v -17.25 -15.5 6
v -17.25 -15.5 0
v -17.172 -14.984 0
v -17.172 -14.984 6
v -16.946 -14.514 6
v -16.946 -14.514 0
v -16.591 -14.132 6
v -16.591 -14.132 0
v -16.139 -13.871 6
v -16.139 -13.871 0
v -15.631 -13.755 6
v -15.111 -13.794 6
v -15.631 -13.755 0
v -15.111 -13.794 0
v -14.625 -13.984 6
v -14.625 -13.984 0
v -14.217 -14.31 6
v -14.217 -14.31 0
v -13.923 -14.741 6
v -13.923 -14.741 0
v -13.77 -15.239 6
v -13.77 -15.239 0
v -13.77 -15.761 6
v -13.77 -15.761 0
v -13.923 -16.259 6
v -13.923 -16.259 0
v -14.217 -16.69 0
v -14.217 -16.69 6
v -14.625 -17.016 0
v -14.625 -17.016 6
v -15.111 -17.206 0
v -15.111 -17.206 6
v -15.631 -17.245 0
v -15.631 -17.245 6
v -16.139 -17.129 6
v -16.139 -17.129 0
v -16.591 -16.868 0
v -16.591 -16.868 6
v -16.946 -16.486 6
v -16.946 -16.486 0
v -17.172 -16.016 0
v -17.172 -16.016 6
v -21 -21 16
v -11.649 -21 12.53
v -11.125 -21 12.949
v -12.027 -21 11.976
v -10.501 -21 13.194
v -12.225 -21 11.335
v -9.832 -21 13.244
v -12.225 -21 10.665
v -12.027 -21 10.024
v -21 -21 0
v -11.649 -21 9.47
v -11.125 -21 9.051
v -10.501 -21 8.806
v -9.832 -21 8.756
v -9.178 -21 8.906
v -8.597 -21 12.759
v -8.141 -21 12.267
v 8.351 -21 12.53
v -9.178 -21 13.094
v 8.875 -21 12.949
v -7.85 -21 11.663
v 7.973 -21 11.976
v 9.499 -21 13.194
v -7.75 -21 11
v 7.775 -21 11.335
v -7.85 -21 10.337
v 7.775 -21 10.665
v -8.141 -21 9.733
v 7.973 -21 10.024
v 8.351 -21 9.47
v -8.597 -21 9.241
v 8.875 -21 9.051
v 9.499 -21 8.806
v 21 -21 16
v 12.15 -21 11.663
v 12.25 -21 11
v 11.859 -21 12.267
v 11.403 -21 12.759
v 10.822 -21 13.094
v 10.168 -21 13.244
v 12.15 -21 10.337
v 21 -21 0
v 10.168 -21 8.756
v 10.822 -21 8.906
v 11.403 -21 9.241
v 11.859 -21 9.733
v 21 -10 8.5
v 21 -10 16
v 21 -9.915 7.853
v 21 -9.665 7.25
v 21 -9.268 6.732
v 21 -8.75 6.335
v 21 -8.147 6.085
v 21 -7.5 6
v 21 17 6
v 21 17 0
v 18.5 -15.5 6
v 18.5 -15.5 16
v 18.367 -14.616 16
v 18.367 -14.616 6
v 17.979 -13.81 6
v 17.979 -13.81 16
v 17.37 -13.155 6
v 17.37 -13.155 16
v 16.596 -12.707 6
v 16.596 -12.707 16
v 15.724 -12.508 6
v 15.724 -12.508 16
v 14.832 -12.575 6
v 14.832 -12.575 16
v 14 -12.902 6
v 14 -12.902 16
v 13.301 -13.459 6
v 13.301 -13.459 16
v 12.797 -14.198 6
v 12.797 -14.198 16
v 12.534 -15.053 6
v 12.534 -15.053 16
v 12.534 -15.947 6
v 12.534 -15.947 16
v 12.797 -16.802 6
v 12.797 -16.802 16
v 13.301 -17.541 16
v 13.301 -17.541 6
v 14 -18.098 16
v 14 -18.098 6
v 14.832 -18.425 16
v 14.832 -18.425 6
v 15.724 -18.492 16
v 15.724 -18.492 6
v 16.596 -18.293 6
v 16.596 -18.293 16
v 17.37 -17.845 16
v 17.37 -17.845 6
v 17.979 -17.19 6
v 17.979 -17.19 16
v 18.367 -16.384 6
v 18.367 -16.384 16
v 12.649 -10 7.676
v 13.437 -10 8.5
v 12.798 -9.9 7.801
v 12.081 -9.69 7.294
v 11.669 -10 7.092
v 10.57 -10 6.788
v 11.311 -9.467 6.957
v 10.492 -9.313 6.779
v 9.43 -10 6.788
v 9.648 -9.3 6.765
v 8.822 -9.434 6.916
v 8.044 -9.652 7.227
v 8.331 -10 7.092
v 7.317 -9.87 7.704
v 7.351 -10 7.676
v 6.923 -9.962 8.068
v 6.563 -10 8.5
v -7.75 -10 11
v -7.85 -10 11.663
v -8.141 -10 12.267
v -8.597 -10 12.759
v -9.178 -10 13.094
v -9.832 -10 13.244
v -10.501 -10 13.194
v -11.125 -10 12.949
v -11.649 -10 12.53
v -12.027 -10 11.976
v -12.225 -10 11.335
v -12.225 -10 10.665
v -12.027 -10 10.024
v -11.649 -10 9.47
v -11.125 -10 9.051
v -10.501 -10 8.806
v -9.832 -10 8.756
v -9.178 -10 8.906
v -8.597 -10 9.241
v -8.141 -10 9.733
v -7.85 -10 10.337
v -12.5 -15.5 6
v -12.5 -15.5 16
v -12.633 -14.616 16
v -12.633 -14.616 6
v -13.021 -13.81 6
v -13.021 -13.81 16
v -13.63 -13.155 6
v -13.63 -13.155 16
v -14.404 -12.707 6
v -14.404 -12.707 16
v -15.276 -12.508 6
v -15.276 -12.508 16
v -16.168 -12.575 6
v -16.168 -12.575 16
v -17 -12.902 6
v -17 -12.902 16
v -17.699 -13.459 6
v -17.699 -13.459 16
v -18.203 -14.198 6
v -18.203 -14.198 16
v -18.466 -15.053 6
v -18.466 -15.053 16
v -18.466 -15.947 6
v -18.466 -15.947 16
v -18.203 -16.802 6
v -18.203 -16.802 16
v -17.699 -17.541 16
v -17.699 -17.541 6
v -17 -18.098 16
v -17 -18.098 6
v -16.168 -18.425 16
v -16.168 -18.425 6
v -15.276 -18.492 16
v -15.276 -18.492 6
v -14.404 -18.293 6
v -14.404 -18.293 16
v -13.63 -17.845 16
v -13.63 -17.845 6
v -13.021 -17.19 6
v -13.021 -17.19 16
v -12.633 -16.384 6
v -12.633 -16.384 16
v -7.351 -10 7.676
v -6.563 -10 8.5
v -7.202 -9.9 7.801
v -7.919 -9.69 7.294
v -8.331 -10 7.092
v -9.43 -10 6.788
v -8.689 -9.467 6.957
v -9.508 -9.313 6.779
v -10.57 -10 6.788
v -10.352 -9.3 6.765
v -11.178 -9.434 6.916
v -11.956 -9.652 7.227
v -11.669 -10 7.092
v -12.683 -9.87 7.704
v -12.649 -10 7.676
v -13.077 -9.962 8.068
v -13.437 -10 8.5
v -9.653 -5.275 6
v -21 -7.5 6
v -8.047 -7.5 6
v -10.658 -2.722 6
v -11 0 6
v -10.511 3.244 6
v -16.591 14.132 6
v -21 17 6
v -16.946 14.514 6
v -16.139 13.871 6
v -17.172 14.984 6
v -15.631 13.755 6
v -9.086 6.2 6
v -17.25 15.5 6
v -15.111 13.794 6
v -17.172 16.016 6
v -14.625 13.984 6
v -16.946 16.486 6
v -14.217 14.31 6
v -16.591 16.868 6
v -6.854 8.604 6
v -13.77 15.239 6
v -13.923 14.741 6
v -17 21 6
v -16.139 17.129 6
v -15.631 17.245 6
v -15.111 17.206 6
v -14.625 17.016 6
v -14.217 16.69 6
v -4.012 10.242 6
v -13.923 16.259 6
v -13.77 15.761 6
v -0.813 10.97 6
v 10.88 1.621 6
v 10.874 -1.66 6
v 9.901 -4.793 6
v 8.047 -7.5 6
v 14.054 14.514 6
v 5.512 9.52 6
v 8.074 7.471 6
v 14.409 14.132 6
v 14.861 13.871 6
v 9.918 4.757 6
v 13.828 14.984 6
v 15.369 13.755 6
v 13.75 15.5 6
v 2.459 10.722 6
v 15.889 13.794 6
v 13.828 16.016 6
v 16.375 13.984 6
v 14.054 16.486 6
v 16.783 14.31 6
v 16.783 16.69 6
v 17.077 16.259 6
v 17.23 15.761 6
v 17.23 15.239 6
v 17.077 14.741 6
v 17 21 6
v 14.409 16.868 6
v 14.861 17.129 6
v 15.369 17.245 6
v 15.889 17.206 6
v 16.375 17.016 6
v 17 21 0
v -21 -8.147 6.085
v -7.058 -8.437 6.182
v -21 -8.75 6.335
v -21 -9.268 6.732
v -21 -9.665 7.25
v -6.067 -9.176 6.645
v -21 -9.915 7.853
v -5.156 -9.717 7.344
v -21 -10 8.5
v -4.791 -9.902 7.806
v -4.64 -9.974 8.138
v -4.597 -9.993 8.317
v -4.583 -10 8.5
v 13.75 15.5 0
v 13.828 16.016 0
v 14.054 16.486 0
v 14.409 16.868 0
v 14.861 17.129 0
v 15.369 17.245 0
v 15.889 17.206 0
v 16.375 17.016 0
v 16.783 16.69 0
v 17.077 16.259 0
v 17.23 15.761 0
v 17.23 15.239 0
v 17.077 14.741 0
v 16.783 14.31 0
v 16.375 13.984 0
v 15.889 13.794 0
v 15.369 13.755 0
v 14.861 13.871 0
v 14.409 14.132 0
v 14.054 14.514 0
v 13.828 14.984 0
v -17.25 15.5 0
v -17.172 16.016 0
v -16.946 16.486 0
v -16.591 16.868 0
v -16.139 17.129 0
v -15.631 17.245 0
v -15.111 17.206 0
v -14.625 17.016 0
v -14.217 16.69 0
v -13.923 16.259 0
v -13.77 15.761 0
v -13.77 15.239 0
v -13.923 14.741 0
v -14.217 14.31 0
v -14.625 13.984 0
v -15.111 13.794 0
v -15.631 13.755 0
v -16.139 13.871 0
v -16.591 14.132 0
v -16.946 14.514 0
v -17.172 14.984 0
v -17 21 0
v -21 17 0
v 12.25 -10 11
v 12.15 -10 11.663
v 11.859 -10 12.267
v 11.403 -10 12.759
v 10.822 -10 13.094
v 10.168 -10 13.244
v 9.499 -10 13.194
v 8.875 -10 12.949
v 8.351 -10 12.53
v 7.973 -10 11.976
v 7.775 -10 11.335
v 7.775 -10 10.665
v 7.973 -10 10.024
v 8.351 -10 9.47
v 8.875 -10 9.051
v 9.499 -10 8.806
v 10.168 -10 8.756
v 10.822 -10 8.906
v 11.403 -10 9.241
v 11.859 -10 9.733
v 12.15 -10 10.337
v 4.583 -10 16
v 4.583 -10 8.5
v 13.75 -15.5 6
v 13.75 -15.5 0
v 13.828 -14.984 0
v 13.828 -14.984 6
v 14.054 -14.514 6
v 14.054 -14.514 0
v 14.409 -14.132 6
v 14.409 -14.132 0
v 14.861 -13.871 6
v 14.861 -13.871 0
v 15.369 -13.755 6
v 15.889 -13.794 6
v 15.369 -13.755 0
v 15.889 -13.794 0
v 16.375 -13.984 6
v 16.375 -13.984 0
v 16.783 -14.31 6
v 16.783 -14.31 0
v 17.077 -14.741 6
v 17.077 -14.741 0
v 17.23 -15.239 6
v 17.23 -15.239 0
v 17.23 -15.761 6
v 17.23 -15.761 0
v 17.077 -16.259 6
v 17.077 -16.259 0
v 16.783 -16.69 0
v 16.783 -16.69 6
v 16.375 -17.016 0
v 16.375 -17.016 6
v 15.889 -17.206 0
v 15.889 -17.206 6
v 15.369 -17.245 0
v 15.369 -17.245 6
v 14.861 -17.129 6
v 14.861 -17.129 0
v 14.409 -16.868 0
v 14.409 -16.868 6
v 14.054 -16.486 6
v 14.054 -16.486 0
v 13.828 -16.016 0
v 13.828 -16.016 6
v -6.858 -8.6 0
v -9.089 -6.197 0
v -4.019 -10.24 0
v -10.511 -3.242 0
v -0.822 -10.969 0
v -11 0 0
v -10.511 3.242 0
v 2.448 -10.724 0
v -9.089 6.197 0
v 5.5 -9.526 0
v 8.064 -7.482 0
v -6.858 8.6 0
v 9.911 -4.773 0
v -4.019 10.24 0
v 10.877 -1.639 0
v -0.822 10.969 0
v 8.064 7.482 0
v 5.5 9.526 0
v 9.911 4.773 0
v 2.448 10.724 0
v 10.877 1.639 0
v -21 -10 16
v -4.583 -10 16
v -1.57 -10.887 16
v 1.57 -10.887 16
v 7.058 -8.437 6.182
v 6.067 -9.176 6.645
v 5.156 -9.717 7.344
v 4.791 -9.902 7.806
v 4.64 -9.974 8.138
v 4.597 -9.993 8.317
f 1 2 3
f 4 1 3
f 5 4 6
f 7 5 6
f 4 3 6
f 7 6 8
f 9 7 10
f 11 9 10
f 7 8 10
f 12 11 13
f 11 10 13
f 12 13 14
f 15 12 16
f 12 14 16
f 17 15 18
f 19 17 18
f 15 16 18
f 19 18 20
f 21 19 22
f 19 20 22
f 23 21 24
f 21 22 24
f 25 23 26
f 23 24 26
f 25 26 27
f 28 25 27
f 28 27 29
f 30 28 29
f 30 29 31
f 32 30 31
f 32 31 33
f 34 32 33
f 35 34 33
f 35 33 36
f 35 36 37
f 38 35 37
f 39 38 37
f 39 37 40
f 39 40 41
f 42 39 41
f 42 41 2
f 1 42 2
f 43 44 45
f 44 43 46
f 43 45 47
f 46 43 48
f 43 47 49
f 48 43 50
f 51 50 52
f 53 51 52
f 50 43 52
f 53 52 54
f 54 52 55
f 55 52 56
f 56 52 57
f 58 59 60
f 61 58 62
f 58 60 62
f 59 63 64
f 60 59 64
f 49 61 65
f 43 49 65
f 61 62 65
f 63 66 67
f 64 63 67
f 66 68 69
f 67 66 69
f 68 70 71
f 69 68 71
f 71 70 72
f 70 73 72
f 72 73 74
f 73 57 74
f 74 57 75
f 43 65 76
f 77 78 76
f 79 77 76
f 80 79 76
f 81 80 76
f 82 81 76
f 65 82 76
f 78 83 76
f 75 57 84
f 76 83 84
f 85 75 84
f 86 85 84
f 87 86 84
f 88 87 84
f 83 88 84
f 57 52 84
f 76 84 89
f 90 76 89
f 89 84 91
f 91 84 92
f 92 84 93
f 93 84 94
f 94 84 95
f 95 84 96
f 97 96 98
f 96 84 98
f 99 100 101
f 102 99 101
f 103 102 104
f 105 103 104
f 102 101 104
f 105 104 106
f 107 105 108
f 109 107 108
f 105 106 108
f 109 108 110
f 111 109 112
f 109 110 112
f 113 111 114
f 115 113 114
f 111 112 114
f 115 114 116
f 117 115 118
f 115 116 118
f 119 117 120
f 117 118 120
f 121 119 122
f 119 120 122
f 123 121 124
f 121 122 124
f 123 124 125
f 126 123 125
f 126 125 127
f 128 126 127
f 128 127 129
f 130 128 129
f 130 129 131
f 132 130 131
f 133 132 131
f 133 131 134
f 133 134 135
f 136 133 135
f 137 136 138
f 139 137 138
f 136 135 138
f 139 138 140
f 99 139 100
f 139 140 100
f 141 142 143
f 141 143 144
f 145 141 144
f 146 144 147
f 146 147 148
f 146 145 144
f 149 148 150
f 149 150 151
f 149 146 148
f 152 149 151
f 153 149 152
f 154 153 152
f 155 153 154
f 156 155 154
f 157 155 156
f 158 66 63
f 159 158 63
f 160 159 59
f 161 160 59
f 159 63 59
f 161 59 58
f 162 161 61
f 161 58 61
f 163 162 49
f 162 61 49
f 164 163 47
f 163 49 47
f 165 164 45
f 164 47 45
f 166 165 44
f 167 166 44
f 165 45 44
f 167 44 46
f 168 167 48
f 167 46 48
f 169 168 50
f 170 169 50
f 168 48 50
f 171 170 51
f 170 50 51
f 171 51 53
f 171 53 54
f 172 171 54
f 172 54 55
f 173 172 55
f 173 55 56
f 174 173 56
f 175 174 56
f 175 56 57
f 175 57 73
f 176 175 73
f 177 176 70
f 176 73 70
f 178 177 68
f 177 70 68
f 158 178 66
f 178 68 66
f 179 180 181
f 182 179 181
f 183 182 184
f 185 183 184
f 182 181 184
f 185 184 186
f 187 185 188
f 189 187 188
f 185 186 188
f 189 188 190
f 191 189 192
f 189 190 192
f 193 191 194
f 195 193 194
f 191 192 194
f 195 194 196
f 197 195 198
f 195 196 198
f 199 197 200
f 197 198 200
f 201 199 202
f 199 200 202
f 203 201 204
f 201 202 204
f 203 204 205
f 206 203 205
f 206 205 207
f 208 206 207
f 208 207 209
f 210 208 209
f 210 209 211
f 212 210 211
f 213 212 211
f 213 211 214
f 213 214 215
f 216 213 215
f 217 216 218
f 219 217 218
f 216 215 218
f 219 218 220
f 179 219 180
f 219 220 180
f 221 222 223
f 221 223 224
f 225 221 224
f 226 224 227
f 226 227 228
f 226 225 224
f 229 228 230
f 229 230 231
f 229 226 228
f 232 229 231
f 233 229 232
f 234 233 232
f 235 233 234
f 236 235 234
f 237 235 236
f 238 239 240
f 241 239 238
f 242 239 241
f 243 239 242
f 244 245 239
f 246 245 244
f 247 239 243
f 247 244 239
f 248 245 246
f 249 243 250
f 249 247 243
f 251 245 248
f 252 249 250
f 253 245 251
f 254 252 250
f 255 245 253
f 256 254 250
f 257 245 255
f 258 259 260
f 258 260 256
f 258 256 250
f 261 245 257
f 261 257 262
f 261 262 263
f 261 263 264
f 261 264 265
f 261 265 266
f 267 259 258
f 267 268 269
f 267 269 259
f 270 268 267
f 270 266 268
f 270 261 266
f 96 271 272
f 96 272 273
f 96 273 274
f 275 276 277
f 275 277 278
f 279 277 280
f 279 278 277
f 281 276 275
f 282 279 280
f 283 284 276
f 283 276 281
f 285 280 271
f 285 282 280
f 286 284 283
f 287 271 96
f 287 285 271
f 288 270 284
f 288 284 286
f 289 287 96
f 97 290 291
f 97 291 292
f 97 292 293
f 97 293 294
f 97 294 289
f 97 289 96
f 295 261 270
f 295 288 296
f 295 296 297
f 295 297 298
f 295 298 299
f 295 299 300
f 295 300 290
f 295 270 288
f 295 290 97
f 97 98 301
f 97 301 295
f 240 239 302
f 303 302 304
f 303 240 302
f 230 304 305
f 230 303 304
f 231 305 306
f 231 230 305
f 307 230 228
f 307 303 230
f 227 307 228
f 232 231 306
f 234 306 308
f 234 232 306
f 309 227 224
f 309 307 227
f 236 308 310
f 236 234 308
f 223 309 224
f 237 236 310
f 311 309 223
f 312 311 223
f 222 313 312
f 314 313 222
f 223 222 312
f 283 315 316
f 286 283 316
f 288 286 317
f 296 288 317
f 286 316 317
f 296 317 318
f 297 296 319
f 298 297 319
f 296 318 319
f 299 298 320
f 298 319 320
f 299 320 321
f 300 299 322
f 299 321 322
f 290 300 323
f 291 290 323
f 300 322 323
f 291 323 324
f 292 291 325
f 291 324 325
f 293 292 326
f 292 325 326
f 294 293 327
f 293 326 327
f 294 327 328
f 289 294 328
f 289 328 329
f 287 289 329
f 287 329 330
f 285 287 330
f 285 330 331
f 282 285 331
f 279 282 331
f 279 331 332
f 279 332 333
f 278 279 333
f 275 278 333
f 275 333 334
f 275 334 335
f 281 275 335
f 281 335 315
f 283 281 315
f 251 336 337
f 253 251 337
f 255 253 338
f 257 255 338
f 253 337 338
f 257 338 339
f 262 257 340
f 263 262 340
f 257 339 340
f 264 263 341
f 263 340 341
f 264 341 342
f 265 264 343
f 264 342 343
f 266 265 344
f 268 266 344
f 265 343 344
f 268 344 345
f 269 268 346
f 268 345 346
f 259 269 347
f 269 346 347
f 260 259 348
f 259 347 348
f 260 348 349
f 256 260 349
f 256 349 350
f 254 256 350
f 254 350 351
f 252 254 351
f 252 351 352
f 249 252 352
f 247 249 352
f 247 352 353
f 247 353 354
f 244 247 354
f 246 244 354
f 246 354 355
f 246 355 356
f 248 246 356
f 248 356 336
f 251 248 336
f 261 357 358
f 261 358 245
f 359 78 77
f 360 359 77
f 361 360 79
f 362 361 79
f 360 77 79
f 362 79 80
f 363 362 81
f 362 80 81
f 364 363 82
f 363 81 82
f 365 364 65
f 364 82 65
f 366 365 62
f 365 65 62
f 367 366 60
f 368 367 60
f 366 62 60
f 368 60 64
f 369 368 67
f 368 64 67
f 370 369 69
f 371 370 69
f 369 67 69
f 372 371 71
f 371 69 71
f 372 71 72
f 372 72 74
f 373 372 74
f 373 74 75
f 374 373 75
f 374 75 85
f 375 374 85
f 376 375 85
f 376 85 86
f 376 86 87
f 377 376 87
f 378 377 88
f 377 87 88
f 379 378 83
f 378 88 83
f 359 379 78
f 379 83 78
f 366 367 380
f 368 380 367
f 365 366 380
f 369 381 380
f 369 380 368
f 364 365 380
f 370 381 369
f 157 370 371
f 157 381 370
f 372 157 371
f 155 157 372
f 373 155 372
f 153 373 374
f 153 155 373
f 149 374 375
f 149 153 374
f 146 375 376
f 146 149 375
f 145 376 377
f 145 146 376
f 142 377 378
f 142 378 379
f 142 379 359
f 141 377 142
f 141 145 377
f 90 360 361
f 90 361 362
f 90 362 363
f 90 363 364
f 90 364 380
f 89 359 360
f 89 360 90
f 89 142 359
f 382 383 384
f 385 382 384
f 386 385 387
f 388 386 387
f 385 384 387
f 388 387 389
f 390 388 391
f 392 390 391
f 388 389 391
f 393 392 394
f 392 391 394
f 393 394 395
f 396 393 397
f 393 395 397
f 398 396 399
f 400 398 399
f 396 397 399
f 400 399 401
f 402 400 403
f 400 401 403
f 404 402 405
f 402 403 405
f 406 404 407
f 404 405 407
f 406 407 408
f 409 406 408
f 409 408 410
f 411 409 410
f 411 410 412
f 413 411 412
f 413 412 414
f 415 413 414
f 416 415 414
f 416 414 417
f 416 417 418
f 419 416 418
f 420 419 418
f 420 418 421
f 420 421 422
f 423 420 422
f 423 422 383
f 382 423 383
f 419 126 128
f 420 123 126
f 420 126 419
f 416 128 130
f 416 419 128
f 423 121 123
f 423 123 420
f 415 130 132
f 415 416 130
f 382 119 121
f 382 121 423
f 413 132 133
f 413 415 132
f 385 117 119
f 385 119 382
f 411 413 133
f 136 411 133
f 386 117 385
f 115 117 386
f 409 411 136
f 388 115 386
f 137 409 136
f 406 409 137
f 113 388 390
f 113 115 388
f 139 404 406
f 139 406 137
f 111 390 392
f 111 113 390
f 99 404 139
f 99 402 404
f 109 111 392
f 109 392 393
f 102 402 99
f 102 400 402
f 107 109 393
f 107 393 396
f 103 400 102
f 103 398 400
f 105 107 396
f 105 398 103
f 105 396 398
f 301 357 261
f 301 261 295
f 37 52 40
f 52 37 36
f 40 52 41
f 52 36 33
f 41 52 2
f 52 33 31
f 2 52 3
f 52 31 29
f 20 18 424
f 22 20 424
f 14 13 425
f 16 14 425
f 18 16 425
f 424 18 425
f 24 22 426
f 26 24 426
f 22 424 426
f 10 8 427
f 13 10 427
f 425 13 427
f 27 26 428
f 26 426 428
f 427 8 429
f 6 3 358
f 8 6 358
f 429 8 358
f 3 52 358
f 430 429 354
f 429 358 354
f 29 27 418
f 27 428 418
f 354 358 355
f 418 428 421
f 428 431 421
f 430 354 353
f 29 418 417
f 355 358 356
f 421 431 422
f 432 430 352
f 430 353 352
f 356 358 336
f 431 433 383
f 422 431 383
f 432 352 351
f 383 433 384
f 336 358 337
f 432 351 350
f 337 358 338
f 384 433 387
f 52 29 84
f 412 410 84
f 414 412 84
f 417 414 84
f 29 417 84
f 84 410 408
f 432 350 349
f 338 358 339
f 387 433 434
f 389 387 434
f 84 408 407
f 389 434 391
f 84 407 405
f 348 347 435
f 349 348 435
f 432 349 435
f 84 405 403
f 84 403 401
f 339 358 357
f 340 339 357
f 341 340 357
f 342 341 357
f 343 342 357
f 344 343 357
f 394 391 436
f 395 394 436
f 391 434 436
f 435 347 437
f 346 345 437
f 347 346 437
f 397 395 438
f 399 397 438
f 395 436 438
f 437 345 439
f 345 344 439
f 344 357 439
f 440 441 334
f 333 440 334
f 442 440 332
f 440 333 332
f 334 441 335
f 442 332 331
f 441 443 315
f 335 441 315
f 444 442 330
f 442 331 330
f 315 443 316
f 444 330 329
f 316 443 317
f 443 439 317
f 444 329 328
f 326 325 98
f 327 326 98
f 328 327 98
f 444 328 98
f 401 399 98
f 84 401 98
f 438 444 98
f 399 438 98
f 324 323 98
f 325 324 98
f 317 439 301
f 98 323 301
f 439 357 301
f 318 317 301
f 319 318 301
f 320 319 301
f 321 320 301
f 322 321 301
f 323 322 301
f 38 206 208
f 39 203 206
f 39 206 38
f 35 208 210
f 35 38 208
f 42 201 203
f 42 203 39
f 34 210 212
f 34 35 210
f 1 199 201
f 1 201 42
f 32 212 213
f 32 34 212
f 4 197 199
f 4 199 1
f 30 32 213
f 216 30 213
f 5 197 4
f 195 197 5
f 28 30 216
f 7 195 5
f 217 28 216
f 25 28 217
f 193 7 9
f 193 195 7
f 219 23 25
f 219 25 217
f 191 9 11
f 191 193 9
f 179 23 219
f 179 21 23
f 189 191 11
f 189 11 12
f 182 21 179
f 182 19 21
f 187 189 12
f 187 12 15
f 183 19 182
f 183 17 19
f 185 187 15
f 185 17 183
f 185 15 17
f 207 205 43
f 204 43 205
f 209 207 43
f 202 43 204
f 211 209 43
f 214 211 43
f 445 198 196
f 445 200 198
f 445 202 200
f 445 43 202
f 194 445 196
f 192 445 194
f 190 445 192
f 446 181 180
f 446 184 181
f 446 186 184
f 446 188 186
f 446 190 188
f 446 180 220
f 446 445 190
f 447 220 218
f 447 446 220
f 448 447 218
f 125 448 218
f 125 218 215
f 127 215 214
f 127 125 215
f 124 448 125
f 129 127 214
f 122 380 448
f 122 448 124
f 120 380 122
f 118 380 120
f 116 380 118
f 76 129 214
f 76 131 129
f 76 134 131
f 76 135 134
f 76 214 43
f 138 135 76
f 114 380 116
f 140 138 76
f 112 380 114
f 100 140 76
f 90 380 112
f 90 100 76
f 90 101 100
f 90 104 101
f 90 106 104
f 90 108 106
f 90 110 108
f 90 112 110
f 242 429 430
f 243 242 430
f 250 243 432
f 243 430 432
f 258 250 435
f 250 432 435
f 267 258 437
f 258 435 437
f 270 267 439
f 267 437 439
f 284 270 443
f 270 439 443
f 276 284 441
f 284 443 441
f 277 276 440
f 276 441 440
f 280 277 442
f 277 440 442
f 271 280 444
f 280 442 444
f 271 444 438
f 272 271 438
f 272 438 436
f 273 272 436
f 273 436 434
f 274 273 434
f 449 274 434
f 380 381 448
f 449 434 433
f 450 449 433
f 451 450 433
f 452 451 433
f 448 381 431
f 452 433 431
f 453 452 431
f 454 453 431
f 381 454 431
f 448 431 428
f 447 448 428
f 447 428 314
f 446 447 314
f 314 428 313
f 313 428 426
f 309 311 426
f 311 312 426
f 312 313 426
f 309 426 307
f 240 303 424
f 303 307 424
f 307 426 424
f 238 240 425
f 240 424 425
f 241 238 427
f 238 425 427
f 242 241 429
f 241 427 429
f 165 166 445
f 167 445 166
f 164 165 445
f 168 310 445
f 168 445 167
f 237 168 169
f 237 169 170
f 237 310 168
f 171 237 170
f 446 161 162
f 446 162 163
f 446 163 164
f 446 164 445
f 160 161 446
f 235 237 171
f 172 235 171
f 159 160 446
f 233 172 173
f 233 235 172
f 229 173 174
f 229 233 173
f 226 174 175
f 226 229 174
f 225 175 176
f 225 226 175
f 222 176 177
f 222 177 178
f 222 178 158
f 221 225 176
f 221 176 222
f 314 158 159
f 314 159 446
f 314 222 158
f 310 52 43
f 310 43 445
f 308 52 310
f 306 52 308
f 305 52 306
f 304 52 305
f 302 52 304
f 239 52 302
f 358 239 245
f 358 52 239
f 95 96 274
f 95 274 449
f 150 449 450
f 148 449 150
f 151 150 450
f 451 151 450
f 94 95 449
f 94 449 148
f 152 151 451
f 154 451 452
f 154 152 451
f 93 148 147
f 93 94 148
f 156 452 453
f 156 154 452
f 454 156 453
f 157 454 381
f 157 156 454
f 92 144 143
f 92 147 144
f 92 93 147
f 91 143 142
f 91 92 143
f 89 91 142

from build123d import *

# Parameters (mm, degrees)
ESBO_O1_W                = 42
ESBO_O1_H                = 42
RESSALTO_EXTRUS_O3_DEPTH = 6
ESBO_O7_W                = 42
ESBO_O7_H                = 11
RESSALTO_EXTRUS_O4_DEPTH = 10
CORTE_EXTRUS_O3_REACH    = 35.734
ESBO_O6_R                = 11
ESBO_O6_R_2              = 1.75
CHANFRO1_SIZE            = 4
FILETE1_R                = 2.5
ESBO_O8_R                = 2.25
CORTE_EXTRUS_O4_DEPTH    = 11
ESBO_O9_R                = 3
CORTE_EXTRUS_O5_DEPTH    = 10
CORTE_EXTRUS_O6_REACH    = 42.719
ESBO_O10_R               = 4.25


with BuildPart() as part:
    # Esboço1 → Ressalto-extrusão3 (new body)
    with BuildSketch(Plane.XY):
        Rectangle(ESBO_O1_W, ESBO_O1_H)
    extrude(amount=RESSALTO_EXTRUS_O3_DEPTH)

    # Esboço7 → Ressalto-extrusão4 (add)
    with BuildSketch(Plane.XY.offset(6)):
        with Locations((0, -15.5)):
            Rectangle(ESBO_O7_W, ESBO_O7_H)
    extrude(amount=RESSALTO_EXTRUS_O4_DEPTH)

    # Corte-extrusão3: up to this face of the body (flat: up to its plane)
    corte_extrus_o3_end = Plane(part.part.faces().sort_by_distance((0, -15.5, 16))[0])
    # Esboço6 → Corte-extrusão3 (cut, up to the picked face)
    with BuildSketch(Plane(origin=(0, 0, 0), x_dir=(-1, 0, 0), z_dir=(0, 0, -1)), mode=Mode.PRIVATE) as corte_extrus_o3_sk1:
        Circle(ESBO_O6_R)
    corte_extrus_o3_tool1 = split(extrude(corte_extrus_o3_sk1.sketch, amount=-CORTE_EXTRUS_O3_REACH, mode=Mode.PRIVATE), bisect_by=corte_extrus_o3_end, keep=Keep.BOTH, mode=Mode.PRIVATE)
    # Esboço6 → Corte-extrusão3 (cut, up to the picked face)
    with BuildSketch(Plane(origin=(0, 0, 0), x_dir=(-1, 0, 0), z_dir=(0, 0, -1)), mode=Mode.PRIVATE) as corte_extrus_o3_sk2:
        with Locations((-15.5, 15.5)):
            Circle(ESBO_O6_R_2)
    corte_extrus_o3_tool2 = split(extrude(corte_extrus_o3_sk2.sketch, amount=-CORTE_EXTRUS_O3_REACH, mode=Mode.PRIVATE), bisect_by=corte_extrus_o3_end, keep=Keep.BOTH, mode=Mode.PRIVATE)
    # Esboço6 → Corte-extrusão3 (cut, up to the picked face)
    with BuildSketch(Plane(origin=(0, 0, 0), x_dir=(-1, 0, 0), z_dir=(0, 0, -1)), mode=Mode.PRIVATE) as corte_extrus_o3_sk3:
        with Locations((15.5, 15.5)):
            Circle(ESBO_O6_R_2)
    corte_extrus_o3_tool3 = split(extrude(corte_extrus_o3_sk3.sketch, amount=-CORTE_EXTRUS_O3_REACH, mode=Mode.PRIVATE), bisect_by=corte_extrus_o3_end, keep=Keep.BOTH, mode=Mode.PRIVATE)
    # Esboço6 → Corte-extrusão3 (cut, up to the picked face)
    with BuildSketch(Plane(origin=(0, 0, 0), x_dir=(-1, 0, 0), z_dir=(0, 0, -1)), mode=Mode.PRIVATE) as corte_extrus_o3_sk4:
        with Locations((15.5, -15.5)):
            Circle(ESBO_O6_R_2)
    corte_extrus_o3_tool4 = split(extrude(corte_extrus_o3_sk4.sketch, amount=-CORTE_EXTRUS_O3_REACH, mode=Mode.PRIVATE), bisect_by=corte_extrus_o3_end, keep=Keep.BOTH, mode=Mode.PRIVATE)
    # Esboço6 → Corte-extrusão3 (cut, up to the picked face)
    with BuildSketch(Plane(origin=(0, 0, 0), x_dir=(-1, 0, 0), z_dir=(0, 0, -1)), mode=Mode.PRIVATE) as corte_extrus_o3_sk5:
        with Locations((-15.5, -15.5)):
            Circle(ESBO_O6_R_2)
    corte_extrus_o3_tool5 = split(extrude(corte_extrus_o3_sk5.sketch, amount=-CORTE_EXTRUS_O3_REACH, mode=Mode.PRIVATE), bisect_by=corte_extrus_o3_end, keep=Keep.BOTH, mode=Mode.PRIVATE)
    add(corte_extrus_o3_tool1.solids().sort_by(Axis((0, 0, 0), (0, 0, 1)))[0], mode=Mode.SUBTRACT)
    add(corte_extrus_o3_tool2.solids().sort_by(Axis((15.5, 15.5, 0), (0, 0, 1)))[0], mode=Mode.SUBTRACT)
    add(corte_extrus_o3_tool3.solids().sort_by(Axis((-15.5, 15.5, 0), (0, 0, 1)))[0], mode=Mode.SUBTRACT)
    add(corte_extrus_o3_tool4.solids().sort_by(Axis((-15.5, -15.5, 0), (0, 0, 1)))[0], mode=Mode.SUBTRACT)
    add(corte_extrus_o3_tool5.solids().sort_by(Axis((15.5, -15.5, 0), (0, 0, 1)))[0], mode=Mode.SUBTRACT)

    # Chanfro1
    chanfro1_edges = [part.edges().sort_by_distance(p)[0] for p in [
        (-21, 21, 3),
        (21, 21, 3),
    ]]
    chamfer(chanfro1_edges, length=CHANFRO1_SIZE)

    # Filete1
    filete1_edges = [part.edges().sort_by_distance(p)[0] for p in [
        (12.791287847, -10, 6),
        (-12.791287847, -10, 6),
    ]]
    fillet(filete1_edges, radius=FILETE1_R)

    # Esboço8 → Corte-extrusão4 (cut)
    with BuildSketch(Plane.XZ.offset(21)):
        with Locations((-10, 11)):
            Circle(ESBO_O8_R)
        with Locations((10, 11)):
            Circle(ESBO_O8_R)
    extrude(amount=-CORTE_EXTRUS_O4_DEPTH, mode=Mode.SUBTRACT)

    # Esboço9 → Corte-extrusão5 (cut)
    with BuildSketch(Plane.XY.offset(16)):
        with Locations((-15.5, -15.5)):
            Circle(ESBO_O9_R)
        with Locations((15.5, -15.5)):
            Circle(ESBO_O9_R)
    extrude(amount=-CORTE_EXTRUS_O5_DEPTH, mode=Mode.SUBTRACT)

    # Esboço10 → Corte-extrusão6 (cut, up to next)
    with BuildSketch(Plane(origin=(0, -10, 0), x_dir=(1, 0, 0), z_dir=(0, 1, 0)), mode=Mode.PRIVATE) as corte_extrus_o6_sk1:
        with Locations((10, -11)):
            Circle(ESBO_O10_R)
    corte_extrus_o6_tool1 = extrude(corte_extrus_o6_sk1.sketch, amount=CORTE_EXTRUS_O6_REACH, mode=Mode.PRIVATE) & part.part
    # Esboço10 → Corte-extrusão6 (cut, up to next)
    with BuildSketch(Plane(origin=(0, -10, 0), x_dir=(1, 0, 0), z_dir=(0, 1, 0)), mode=Mode.PRIVATE) as corte_extrus_o6_sk2:
        with Locations((-10, -11)):
            Circle(ESBO_O10_R)
    corte_extrus_o6_tool2 = extrude(corte_extrus_o6_sk2.sketch, amount=CORTE_EXTRUS_O6_REACH, mode=Mode.PRIVATE) & part.part
    add(corte_extrus_o6_tool1.solids().sort_by_distance((10, -10, 11))[0], mode=Mode.SUBTRACT)
    add(corte_extrus_o6_tool2.solids().sort_by_distance((-10, -10, 11))[0], mode=Mode.SUBTRACT)


solid = part.part
